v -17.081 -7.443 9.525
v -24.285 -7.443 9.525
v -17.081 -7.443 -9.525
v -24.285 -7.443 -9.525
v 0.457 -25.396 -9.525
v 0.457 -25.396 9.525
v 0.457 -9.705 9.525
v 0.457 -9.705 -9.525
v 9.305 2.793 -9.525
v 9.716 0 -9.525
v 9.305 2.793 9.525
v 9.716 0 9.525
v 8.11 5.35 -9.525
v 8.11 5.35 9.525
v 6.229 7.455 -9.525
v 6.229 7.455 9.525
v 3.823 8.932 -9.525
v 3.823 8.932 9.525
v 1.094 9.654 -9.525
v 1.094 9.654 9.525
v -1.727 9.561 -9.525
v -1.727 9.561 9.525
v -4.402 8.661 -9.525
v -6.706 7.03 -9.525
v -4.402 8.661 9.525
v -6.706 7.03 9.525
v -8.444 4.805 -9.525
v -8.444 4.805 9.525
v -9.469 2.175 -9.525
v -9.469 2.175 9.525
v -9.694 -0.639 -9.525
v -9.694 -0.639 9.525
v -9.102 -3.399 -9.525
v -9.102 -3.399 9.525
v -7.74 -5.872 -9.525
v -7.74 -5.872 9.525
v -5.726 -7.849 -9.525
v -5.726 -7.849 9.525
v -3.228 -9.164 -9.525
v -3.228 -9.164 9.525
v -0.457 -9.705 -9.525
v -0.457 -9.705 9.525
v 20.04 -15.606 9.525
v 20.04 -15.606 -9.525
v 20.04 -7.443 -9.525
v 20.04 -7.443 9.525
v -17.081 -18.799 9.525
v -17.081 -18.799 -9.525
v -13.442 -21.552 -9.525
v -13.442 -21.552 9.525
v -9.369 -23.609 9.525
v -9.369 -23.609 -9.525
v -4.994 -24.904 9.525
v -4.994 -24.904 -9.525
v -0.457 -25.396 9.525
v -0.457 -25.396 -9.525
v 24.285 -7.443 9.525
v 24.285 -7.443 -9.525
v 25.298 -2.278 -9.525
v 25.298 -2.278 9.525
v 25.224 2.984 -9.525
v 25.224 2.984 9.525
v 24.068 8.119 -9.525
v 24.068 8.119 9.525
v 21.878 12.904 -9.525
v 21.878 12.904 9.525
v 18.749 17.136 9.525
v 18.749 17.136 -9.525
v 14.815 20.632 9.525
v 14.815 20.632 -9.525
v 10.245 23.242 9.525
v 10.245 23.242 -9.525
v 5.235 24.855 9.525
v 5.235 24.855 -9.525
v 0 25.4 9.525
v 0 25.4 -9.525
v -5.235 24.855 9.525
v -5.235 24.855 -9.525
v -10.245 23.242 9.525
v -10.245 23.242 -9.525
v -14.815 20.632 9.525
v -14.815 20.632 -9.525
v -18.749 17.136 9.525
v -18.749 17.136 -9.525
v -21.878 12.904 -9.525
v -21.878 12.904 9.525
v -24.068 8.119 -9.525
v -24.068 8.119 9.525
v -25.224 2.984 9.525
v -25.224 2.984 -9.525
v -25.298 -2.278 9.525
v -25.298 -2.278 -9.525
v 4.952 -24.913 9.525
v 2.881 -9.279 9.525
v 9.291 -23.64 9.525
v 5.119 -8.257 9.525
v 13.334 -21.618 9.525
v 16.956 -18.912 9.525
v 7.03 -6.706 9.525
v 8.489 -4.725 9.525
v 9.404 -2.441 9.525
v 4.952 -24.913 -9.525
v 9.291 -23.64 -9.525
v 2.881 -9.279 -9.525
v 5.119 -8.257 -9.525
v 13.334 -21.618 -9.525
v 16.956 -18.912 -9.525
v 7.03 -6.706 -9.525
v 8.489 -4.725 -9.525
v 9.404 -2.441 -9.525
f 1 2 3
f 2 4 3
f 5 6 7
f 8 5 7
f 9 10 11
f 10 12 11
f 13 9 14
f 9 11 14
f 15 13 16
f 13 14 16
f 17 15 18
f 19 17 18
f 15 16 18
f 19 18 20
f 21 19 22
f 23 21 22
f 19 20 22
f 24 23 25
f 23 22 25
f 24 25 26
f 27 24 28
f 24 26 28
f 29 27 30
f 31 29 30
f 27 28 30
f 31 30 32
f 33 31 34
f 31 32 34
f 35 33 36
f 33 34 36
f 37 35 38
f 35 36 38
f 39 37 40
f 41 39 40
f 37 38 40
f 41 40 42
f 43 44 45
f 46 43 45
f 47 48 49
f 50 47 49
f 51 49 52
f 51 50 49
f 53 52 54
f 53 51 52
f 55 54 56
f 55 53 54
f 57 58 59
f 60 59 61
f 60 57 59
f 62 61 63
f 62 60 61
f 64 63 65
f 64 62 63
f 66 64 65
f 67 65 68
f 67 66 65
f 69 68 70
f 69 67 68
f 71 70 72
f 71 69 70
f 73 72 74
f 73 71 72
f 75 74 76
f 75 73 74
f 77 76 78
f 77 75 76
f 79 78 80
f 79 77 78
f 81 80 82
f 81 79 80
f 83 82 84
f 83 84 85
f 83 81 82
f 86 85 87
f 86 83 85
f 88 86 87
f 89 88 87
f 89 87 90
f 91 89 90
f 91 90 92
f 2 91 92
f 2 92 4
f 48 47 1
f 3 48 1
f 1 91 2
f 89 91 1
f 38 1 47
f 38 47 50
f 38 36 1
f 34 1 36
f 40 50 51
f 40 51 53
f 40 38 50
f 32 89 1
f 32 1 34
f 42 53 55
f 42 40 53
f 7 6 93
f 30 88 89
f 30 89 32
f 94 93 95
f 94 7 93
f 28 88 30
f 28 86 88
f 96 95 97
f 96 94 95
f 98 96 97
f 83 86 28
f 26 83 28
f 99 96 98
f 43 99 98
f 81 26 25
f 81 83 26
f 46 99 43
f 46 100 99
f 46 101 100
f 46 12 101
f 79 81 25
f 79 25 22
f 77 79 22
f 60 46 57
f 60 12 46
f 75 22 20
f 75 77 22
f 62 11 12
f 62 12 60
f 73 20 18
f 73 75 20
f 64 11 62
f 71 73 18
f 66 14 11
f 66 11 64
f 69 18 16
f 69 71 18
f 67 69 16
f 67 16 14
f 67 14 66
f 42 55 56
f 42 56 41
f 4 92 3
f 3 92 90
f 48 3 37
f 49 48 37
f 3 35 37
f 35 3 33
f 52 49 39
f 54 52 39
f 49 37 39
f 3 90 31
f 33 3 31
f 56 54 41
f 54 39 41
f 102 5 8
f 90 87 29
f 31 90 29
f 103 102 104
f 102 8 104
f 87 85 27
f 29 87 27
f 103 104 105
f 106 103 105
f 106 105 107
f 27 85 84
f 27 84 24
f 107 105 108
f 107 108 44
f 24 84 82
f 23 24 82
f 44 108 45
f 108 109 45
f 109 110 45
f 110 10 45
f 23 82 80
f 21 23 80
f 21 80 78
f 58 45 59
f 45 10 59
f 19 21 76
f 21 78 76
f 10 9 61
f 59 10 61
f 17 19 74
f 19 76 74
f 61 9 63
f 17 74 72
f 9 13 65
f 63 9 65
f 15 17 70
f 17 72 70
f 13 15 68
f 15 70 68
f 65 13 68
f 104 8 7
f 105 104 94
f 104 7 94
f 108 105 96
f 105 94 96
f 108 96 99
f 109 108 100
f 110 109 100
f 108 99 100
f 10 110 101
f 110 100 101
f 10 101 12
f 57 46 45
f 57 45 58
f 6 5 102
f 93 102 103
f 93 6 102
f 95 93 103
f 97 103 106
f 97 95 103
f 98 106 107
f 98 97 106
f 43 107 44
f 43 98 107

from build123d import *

# Parameters (mm, degrees)
F0_R     = 25.4
F0_R_2   = 9.5885
F1_DEPTH = 9.525
F2_W     = 11.421807
F2_H     = 11.861946
F2_W_2   = 16.656801
F2_H_2   = 15.350755
F3_DEPTH = 17.78
F4_W     = 0.9144
F4_H     = 22.793547
F5_DEPTH = 15.5956
F6_R     = 9.7155
F7_DEPTH = 38.1


with BuildPart() as f1:
    # F0 (on Top) → F1 (new body, symmetric)
    with BuildSketch(Plane.XY):
        Circle(F0_R)
        Circle(F0_R_2, mode=Mode.SUBTRACT)
    extrude(amount=F1_DEPTH, both=True)

    # F2 (on Top) → F3 (cut, symmetric)
    with BuildSketch(Plane.XY):
        with Locations((-22.791632, -13.373764)):
            Rectangle(F2_W, F2_H)
        with Locations((28.368551, -15.118168)):
            Rectangle(F2_W_2, F2_H_2)
    extrude(amount=F3_DEPTH, both=True, mode=Mode.SUBTRACT)

    # F4 (on Top) → F5 (cut, symmetric)
    with BuildSketch(Plane.XY):
        with Locations((0, -17.44404)):
            Rectangle(F4_W, F4_H)
    extrude(amount=F5_DEPTH, both=True, mode=Mode.SUBTRACT)

    # F6 (on Top) → F7 (cut, symmetric)
    with BuildSketch(Plane.XY):
        Circle(F6_R)
    extrude(amount=F7_DEPTH, both=True, mode=Mode.SUBTRACT)


solid = f1.part
